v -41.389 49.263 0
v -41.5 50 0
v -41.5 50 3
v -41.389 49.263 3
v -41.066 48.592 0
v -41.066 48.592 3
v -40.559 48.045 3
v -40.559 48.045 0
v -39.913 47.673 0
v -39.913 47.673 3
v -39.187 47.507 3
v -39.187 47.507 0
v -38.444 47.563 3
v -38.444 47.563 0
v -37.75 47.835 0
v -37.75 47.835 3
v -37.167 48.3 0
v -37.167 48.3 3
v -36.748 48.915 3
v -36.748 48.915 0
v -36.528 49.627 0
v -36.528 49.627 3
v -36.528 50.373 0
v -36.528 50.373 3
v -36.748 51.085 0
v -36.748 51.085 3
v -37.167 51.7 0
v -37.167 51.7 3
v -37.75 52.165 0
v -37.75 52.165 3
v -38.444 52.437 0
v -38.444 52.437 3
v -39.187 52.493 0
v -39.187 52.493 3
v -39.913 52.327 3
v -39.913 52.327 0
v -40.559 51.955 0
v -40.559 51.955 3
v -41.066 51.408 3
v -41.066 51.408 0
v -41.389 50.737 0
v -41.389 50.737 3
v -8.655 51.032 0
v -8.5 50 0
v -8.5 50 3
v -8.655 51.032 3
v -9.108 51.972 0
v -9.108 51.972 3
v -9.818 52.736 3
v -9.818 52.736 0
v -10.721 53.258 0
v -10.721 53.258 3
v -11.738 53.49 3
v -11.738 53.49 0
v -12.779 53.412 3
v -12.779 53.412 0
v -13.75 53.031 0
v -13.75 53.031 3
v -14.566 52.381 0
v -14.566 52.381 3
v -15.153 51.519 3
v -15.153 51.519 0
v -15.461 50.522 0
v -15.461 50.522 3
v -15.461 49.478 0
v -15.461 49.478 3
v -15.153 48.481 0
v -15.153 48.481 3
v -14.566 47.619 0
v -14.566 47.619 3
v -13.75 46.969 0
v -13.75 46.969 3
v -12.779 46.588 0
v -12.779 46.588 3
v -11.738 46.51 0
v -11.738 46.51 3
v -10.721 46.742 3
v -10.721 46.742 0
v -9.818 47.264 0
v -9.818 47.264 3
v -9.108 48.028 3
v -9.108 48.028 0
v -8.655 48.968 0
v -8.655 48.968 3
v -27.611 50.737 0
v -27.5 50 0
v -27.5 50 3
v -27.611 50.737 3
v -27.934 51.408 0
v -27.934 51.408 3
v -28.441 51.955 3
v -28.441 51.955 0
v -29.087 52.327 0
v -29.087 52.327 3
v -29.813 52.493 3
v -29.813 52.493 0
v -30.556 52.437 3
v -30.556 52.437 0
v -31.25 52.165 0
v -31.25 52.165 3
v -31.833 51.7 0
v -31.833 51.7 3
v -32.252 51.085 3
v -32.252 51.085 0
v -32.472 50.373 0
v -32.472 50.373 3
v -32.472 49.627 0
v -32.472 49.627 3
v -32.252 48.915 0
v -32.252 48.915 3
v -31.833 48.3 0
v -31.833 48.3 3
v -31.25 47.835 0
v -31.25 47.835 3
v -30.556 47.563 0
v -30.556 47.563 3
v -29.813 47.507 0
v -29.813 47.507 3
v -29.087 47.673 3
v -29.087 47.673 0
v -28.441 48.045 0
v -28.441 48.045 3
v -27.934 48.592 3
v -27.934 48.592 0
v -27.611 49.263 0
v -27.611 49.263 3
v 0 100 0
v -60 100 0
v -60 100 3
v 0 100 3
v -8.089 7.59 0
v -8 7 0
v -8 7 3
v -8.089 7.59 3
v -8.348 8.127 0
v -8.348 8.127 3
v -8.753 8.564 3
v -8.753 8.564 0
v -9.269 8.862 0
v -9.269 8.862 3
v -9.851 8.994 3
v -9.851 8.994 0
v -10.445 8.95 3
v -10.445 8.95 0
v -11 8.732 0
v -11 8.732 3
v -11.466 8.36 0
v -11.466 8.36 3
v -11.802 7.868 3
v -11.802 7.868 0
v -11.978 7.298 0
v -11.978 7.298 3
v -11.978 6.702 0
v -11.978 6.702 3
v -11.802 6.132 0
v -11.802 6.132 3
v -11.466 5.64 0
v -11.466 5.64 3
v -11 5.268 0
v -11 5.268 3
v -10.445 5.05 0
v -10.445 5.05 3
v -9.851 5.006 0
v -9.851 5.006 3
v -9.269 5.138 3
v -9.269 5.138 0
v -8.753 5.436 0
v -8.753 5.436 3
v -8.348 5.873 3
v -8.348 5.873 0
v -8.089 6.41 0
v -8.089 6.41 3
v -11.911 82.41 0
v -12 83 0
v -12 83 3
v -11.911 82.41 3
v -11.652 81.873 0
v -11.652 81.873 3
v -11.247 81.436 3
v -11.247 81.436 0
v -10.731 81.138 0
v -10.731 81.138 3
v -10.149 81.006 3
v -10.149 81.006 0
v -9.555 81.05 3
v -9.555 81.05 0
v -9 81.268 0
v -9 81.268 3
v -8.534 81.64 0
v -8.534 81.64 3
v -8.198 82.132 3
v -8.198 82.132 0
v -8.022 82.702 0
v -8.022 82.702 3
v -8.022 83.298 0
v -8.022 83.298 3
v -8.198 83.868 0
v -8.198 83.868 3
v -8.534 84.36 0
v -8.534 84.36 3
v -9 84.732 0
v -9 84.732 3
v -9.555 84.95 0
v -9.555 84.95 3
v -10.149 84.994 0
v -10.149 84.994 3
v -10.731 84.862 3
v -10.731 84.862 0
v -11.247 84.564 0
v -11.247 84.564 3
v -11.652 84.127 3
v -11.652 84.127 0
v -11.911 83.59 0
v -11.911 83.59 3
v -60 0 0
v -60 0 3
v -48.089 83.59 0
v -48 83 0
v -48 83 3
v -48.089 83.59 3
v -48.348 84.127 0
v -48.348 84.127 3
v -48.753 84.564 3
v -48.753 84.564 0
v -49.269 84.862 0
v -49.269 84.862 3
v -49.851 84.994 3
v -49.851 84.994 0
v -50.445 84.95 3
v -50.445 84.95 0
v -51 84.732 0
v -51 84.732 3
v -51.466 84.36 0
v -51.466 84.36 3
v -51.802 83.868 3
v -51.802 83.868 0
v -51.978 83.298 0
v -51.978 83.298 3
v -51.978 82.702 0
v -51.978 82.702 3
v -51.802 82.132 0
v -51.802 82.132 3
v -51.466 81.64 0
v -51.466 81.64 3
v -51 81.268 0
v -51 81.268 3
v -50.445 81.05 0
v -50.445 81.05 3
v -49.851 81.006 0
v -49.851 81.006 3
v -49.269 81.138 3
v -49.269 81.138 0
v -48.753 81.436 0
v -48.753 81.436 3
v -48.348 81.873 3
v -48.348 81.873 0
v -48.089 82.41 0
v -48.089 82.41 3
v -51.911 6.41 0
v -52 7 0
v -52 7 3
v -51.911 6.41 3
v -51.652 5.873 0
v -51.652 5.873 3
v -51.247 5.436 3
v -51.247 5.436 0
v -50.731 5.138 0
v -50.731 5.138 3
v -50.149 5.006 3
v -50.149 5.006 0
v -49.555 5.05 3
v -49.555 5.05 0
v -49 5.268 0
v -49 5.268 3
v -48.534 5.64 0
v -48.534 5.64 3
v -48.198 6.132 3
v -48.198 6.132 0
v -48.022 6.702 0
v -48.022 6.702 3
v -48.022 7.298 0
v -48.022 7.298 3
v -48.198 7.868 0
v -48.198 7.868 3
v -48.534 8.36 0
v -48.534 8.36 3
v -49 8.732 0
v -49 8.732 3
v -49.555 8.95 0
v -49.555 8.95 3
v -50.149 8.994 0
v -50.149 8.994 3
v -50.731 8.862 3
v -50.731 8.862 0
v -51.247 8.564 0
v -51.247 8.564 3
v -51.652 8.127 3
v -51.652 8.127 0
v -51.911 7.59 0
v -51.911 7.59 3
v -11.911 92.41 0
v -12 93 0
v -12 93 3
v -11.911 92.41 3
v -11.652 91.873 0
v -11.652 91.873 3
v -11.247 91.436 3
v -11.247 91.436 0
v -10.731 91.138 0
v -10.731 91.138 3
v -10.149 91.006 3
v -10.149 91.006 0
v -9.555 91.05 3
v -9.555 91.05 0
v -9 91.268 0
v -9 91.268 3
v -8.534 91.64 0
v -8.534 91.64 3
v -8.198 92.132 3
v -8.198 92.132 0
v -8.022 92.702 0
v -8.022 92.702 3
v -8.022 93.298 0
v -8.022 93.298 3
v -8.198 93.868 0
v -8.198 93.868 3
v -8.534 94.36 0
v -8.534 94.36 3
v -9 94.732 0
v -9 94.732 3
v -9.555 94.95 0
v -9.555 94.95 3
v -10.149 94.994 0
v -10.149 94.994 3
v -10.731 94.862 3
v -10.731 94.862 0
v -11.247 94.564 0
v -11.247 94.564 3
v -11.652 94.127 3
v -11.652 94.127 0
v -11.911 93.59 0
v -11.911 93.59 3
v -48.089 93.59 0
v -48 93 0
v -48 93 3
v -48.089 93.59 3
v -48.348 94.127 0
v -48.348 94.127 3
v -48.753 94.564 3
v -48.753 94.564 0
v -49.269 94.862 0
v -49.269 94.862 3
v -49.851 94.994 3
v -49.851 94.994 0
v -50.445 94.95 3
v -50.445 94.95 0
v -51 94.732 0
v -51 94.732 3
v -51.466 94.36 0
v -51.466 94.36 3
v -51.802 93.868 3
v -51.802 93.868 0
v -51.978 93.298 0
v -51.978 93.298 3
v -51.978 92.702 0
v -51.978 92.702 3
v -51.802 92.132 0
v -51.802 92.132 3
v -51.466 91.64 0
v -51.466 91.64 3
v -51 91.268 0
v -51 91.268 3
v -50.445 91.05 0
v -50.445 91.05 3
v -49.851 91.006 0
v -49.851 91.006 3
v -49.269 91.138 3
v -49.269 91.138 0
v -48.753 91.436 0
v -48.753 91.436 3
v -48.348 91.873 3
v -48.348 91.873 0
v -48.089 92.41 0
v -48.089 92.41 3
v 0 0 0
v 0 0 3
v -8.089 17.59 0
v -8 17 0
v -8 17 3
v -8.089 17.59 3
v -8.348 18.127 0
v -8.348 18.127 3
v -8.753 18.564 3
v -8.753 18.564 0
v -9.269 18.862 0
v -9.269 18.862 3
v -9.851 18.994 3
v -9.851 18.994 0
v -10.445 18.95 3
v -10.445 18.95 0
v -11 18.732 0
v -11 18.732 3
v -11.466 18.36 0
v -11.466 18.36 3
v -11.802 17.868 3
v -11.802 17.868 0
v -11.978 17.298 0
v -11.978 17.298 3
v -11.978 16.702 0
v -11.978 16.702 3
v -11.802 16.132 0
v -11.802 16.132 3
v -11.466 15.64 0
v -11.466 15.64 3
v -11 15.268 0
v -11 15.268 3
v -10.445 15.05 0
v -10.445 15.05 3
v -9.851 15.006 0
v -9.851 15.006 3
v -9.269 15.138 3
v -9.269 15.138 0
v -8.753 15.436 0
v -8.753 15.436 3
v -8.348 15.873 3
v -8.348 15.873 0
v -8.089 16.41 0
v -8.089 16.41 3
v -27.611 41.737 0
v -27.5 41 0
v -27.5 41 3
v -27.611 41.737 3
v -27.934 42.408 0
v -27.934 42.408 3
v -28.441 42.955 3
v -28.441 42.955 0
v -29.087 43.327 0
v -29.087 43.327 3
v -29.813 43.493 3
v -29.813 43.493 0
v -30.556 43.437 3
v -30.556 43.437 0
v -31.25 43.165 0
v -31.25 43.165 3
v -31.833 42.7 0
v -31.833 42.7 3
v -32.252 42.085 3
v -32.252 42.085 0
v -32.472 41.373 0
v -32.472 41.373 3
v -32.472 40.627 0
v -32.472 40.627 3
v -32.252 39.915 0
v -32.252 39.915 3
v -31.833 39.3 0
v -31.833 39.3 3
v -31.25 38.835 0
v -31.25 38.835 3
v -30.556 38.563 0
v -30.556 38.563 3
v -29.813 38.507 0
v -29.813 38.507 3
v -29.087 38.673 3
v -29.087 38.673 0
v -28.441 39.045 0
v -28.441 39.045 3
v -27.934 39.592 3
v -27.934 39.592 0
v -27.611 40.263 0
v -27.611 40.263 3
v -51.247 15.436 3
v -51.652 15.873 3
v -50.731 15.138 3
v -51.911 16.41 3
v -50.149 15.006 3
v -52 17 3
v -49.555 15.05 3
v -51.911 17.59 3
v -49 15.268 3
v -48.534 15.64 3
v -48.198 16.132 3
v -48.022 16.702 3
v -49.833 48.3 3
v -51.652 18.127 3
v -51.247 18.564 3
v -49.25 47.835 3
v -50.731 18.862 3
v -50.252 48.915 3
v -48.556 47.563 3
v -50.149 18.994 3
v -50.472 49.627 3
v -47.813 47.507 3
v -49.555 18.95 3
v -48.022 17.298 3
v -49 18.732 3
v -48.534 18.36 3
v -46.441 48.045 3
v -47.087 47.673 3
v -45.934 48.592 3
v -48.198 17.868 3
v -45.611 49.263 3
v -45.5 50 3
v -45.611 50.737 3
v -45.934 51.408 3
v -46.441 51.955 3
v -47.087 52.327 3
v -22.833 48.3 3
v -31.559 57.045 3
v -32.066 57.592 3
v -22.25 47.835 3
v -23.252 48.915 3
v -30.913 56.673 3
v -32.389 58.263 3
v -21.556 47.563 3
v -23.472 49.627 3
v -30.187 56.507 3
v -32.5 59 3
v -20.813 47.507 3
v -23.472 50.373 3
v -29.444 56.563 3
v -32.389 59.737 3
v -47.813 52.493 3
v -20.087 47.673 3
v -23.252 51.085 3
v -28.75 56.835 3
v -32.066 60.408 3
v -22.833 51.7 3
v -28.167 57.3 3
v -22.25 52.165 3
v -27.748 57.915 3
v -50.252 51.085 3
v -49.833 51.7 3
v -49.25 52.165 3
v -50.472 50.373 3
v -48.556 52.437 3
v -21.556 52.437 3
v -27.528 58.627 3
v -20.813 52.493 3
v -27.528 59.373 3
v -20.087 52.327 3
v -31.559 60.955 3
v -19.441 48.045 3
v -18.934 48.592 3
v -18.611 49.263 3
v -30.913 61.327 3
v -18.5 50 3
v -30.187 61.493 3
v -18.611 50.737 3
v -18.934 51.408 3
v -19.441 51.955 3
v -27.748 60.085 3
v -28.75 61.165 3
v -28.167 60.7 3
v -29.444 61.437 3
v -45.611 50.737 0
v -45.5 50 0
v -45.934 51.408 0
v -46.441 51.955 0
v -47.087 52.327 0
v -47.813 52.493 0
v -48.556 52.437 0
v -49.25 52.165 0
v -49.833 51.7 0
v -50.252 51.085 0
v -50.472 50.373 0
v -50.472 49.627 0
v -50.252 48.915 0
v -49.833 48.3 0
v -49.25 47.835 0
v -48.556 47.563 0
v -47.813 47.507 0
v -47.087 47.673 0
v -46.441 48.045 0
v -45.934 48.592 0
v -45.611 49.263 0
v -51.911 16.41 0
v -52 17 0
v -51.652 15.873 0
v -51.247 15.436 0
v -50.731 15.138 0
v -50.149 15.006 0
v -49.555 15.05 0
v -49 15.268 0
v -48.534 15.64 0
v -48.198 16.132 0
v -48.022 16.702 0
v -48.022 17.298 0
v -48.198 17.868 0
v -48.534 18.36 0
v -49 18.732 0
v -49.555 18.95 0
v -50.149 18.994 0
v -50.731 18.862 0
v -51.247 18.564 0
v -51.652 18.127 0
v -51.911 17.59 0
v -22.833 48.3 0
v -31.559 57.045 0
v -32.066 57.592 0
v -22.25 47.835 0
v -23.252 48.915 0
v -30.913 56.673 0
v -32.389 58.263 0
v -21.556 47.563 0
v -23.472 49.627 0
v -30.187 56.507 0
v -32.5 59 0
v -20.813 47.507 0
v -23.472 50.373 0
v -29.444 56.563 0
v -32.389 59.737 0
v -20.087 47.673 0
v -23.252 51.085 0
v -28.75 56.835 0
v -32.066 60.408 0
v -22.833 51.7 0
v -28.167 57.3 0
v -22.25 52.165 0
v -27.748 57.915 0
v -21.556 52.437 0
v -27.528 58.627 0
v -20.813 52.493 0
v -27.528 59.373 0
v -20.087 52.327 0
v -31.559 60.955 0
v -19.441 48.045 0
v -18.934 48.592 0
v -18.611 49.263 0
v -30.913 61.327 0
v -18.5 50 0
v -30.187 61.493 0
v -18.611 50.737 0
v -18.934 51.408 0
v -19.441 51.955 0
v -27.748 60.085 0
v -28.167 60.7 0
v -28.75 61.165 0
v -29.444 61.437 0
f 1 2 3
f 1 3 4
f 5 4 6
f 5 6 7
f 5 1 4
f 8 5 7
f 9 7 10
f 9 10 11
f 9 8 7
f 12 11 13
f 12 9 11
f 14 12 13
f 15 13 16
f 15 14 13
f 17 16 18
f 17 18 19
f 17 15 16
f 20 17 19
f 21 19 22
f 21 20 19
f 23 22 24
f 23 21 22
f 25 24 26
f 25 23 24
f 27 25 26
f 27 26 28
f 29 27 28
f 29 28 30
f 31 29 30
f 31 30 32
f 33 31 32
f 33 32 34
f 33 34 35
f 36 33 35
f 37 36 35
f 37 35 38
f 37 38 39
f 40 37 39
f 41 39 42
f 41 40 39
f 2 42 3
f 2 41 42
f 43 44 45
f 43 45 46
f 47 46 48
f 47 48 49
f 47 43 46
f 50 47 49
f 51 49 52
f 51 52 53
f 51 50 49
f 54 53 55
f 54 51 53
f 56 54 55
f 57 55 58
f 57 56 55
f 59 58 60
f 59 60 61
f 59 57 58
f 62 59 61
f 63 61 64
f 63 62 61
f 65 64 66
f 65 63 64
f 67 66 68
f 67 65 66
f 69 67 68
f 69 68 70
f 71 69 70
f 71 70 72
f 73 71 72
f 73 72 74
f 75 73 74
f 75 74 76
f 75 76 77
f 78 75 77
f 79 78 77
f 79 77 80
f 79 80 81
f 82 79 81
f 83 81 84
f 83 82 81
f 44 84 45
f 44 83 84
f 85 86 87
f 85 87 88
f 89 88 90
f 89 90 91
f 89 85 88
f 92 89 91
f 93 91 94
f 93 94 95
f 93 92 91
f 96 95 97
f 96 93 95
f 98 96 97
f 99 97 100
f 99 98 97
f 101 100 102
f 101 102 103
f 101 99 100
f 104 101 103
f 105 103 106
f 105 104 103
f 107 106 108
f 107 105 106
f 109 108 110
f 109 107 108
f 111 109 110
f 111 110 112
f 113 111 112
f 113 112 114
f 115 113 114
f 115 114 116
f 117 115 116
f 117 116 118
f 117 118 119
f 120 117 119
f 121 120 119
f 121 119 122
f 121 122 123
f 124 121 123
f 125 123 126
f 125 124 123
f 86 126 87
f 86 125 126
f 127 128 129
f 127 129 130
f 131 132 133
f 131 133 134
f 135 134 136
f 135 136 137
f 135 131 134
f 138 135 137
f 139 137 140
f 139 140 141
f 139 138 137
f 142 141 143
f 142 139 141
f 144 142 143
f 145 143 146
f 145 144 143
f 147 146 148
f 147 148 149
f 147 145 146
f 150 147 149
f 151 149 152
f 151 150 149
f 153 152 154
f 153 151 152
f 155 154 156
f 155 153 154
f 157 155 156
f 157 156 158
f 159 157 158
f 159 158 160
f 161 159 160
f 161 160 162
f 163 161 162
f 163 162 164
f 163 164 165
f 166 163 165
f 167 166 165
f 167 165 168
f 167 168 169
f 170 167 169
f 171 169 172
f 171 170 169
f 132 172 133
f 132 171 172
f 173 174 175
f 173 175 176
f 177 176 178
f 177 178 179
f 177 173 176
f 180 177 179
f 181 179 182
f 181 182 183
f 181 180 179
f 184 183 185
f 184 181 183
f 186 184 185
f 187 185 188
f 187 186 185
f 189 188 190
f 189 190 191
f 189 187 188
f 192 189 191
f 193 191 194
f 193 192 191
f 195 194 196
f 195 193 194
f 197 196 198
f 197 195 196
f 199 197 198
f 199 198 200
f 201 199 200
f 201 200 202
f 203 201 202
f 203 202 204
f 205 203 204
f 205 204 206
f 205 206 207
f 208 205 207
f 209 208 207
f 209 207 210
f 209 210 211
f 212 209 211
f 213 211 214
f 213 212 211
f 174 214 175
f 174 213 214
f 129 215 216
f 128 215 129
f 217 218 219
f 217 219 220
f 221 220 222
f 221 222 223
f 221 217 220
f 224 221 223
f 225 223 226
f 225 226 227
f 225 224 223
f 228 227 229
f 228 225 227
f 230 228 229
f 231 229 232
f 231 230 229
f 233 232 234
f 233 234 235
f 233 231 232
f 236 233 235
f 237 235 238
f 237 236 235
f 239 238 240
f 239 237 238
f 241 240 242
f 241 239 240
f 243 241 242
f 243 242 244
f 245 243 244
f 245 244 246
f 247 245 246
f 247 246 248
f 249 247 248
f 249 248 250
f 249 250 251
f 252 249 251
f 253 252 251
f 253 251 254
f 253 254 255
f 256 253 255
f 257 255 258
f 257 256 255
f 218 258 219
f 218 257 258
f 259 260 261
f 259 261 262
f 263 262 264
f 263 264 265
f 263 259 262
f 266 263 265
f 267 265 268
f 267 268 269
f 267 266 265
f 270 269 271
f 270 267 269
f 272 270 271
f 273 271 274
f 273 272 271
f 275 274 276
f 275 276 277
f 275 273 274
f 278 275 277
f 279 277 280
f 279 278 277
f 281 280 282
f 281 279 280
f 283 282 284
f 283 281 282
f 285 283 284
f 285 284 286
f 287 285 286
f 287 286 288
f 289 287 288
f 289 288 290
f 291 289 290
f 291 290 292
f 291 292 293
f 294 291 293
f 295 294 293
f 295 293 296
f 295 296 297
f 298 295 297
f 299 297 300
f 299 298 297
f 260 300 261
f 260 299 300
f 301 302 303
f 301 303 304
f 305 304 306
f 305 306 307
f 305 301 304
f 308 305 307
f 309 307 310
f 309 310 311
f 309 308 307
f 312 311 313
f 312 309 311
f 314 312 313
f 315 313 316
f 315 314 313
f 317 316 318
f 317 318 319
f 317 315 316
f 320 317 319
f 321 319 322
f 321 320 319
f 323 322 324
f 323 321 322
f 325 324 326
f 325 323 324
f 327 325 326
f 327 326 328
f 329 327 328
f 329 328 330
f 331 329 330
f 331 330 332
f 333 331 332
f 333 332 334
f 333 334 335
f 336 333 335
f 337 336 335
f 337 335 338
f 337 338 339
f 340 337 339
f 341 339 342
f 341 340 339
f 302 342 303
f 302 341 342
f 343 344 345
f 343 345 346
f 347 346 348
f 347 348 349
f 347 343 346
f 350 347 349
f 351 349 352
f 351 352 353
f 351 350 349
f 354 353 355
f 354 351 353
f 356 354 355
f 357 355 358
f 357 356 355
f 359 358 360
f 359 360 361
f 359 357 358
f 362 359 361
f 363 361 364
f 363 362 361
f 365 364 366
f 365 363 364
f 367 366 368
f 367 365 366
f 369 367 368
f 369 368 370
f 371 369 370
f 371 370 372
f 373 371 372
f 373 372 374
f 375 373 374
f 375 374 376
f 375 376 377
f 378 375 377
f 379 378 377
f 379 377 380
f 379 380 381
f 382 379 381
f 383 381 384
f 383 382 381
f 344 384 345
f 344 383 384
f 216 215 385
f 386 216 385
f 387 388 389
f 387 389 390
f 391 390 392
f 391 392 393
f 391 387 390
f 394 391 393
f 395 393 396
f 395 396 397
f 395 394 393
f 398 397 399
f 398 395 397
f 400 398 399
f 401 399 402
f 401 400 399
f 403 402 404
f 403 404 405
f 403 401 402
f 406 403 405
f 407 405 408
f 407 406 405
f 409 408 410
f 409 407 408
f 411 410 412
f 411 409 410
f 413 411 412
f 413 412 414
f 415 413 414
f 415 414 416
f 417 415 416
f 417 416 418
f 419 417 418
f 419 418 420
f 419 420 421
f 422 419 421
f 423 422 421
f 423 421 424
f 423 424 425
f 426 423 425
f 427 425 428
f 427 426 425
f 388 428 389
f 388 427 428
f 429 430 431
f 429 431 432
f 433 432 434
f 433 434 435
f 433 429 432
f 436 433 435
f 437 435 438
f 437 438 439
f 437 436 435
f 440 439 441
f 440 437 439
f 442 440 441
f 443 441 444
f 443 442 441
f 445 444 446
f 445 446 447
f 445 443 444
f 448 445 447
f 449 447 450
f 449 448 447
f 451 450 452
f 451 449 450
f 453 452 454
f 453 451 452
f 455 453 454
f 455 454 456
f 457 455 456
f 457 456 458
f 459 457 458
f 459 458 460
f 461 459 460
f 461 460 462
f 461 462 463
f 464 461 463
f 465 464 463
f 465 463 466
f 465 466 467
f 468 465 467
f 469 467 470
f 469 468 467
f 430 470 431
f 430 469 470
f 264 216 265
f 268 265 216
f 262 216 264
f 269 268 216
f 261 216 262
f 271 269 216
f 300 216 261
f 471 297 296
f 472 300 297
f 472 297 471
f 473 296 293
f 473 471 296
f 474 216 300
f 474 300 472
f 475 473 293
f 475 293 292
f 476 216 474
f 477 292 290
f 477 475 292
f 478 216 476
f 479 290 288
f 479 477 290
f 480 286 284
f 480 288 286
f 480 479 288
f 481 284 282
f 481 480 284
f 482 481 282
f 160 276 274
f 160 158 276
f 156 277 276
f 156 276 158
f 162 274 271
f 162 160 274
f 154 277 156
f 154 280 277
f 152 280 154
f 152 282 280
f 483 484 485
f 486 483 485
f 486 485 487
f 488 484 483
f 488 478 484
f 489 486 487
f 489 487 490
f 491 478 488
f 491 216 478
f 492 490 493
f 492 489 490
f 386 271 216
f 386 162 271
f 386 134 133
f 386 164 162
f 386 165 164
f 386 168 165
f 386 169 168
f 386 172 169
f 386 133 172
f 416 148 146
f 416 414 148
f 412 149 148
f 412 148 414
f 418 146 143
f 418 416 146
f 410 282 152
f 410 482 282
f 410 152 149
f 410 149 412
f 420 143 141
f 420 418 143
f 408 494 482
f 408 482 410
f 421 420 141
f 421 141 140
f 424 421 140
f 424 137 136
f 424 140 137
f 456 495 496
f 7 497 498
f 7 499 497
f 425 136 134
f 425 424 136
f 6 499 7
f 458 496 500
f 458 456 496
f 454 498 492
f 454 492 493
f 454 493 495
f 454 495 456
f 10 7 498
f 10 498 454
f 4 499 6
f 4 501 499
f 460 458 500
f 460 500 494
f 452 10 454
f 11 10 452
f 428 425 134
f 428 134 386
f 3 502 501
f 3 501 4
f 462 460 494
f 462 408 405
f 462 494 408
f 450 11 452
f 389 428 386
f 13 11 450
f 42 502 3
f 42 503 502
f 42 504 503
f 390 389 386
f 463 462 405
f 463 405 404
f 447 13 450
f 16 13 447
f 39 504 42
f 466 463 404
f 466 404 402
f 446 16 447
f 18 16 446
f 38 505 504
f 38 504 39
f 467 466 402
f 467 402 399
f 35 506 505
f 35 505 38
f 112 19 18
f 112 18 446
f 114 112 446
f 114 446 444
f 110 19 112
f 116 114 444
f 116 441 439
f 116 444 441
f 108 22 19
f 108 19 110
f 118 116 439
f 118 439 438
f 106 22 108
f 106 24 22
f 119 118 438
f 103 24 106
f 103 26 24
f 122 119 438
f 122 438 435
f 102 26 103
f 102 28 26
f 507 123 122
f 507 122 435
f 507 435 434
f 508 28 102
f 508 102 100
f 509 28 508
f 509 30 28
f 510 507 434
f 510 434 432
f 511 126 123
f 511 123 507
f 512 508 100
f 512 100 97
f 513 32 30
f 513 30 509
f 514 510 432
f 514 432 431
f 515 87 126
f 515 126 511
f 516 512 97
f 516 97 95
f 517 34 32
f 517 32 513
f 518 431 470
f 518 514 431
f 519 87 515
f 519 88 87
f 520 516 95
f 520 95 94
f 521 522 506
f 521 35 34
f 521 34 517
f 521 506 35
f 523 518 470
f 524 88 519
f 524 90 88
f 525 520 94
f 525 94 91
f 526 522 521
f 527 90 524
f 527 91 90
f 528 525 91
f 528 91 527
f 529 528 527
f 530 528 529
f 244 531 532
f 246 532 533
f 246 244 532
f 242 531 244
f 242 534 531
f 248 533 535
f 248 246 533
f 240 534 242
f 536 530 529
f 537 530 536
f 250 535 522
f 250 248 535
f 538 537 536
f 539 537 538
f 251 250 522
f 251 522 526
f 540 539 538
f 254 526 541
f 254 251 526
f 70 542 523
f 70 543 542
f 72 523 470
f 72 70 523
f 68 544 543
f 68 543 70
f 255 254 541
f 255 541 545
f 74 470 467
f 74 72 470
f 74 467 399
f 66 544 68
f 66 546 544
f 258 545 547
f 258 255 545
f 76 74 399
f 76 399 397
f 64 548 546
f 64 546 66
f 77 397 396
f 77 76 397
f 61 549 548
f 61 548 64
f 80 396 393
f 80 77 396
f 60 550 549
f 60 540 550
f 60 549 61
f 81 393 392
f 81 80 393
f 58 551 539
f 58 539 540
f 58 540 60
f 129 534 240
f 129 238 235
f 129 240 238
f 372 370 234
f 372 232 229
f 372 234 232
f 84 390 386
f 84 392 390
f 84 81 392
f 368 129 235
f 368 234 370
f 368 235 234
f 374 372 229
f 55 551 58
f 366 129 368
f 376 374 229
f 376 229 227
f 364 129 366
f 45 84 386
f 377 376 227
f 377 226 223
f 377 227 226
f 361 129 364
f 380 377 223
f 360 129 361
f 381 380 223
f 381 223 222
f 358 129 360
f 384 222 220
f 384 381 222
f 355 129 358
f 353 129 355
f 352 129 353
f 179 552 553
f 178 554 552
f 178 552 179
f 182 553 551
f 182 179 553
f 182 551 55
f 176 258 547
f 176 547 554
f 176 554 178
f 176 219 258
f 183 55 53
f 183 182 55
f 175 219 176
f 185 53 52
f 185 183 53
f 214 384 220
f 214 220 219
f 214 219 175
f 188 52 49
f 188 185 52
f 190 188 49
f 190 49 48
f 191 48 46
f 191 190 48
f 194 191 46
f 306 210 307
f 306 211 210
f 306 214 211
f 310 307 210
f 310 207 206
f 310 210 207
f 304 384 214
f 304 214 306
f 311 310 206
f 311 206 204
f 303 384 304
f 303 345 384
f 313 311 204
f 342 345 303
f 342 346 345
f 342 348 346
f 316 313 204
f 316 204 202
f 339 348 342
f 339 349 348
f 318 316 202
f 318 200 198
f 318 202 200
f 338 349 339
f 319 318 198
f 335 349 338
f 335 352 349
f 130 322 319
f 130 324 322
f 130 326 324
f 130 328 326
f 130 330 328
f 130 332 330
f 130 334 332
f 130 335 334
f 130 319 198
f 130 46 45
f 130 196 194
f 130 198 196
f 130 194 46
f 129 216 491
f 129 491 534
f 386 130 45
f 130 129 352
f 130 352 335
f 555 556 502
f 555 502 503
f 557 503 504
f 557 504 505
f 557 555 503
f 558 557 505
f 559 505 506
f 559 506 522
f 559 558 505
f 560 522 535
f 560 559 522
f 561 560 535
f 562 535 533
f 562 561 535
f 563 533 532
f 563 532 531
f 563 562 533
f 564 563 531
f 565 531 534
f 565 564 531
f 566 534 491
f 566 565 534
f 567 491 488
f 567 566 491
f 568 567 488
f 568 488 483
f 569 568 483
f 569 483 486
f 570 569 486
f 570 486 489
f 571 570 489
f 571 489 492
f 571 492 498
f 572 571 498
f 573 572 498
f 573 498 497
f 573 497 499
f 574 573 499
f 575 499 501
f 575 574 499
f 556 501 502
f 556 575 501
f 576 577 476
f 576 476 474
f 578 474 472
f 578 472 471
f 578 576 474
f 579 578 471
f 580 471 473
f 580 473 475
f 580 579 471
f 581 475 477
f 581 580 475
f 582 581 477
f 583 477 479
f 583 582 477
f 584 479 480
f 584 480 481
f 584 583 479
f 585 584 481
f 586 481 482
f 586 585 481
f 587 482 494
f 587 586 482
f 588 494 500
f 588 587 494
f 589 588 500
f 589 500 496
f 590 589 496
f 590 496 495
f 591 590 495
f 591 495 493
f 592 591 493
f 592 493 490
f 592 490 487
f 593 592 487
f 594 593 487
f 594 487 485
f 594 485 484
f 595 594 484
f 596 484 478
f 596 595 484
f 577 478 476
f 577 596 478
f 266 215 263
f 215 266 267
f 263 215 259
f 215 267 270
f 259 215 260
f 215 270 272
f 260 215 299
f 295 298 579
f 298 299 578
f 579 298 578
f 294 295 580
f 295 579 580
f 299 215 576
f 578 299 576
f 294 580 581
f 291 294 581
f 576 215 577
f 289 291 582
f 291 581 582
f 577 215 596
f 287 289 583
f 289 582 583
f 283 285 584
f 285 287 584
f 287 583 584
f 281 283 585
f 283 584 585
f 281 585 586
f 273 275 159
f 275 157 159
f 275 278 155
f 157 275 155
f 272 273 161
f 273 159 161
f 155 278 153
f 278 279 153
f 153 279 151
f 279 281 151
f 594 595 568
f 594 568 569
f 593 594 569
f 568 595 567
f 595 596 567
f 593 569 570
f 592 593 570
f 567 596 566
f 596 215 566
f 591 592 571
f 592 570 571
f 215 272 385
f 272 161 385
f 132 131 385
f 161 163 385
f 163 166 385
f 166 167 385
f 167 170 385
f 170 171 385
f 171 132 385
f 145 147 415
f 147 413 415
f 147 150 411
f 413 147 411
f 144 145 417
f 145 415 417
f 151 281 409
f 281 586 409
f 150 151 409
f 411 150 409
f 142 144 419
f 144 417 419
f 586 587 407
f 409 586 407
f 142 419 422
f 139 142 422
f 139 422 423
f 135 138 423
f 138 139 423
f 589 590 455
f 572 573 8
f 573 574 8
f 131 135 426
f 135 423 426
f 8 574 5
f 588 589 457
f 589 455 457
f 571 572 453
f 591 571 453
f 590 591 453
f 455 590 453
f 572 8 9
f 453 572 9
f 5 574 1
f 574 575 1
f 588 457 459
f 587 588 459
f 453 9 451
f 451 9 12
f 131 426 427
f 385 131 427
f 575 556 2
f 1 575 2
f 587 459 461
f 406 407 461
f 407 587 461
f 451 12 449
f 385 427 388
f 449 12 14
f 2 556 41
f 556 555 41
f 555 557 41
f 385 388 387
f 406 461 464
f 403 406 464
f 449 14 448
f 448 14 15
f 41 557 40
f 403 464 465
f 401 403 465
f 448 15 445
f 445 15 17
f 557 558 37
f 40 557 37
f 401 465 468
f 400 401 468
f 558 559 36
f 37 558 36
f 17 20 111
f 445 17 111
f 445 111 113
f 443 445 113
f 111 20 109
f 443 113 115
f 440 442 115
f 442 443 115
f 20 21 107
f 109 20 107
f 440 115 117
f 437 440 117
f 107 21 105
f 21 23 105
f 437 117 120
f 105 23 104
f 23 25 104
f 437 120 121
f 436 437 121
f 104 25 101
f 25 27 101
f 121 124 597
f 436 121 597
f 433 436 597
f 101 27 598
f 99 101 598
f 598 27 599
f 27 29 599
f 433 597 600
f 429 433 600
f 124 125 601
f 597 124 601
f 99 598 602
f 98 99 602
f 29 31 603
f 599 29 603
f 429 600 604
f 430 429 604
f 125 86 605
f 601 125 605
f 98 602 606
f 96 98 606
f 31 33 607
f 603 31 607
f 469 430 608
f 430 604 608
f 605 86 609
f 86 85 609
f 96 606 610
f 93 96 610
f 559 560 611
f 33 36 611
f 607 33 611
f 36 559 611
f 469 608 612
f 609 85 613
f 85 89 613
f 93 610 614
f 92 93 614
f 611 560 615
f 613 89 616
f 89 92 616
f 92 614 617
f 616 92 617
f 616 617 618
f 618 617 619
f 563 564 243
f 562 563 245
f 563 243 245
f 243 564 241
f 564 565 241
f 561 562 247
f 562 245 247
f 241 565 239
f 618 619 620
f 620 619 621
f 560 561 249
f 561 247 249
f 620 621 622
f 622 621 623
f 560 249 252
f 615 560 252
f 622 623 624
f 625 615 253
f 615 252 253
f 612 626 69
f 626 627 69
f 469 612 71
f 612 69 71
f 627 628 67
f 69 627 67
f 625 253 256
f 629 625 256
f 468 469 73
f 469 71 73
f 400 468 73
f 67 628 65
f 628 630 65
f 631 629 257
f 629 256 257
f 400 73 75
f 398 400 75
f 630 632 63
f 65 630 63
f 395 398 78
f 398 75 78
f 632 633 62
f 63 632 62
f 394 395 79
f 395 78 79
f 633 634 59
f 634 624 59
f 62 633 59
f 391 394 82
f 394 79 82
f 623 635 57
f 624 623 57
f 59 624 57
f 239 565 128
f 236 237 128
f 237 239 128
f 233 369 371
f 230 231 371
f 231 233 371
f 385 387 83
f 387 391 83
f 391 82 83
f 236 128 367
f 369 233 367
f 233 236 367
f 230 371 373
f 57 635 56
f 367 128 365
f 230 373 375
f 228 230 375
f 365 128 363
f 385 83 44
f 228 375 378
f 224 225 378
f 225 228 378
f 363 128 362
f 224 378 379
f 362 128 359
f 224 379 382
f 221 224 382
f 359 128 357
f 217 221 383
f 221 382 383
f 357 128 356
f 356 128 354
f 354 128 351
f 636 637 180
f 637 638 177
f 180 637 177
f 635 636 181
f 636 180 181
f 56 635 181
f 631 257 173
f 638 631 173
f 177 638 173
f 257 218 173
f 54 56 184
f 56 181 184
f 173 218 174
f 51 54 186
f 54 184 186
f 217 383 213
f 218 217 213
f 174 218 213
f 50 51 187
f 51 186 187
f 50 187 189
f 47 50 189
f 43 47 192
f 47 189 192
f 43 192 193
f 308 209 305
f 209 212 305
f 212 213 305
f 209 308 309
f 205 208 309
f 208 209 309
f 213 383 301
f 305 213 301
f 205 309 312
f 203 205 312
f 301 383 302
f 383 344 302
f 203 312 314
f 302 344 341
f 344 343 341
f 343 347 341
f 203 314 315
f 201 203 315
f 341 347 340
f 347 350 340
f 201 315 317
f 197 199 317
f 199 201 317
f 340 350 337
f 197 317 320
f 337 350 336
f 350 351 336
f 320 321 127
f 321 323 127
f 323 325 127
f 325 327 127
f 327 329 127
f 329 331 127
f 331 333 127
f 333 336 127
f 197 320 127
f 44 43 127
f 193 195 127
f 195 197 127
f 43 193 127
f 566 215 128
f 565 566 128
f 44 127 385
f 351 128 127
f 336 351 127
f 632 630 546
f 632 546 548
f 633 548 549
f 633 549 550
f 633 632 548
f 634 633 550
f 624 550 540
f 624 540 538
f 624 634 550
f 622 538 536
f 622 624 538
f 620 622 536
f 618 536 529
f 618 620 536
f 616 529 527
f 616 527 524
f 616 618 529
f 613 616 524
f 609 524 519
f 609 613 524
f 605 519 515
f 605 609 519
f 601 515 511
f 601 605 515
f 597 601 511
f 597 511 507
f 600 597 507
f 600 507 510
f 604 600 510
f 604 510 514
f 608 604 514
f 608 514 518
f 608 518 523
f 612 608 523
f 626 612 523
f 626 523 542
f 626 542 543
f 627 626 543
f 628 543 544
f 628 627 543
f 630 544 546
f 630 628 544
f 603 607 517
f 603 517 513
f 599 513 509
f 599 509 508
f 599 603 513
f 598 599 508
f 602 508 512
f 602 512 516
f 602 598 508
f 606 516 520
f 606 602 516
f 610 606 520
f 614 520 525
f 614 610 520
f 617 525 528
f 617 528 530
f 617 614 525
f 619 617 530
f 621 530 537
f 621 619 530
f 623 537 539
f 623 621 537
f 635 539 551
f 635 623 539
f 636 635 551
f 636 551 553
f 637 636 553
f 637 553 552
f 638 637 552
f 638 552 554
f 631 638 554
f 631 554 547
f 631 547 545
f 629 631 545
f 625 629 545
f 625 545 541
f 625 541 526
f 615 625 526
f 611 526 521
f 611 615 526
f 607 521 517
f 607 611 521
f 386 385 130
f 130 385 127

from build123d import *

# Parameters (mm, degrees)
SKETCH_1_W      = 60
SKETCH_1_H      = 100
SKETCH_1_R      = 2.5
SKETCH_1_R_2    = 2
SKETCH_1_R_3    = 3.5
EXTRUDE_1_DEPTH = 3


with BuildPart() as part:
    # Эскиз1 → Бобышка-Вытянуть1 (new body)
    with BuildSketch(Plane.XY):
        with Locations((-30, 50)):
            Rectangle(SKETCH_1_W, SKETCH_1_H)
        with Locations((-30, 50)):
            Circle(SKETCH_1_R, mode=Mode.SUBTRACT)
        with Locations((-21, 50)):
            Circle(SKETCH_1_R, mode=Mode.SUBTRACT)
        with Locations(Location((-39, 50, 0), (0, 0, 180))):
            Circle(SKETCH_1_R, mode=Mode.SUBTRACT)
        with Locations((-30, 41)):
            Circle(SKETCH_1_R, mode=Mode.SUBTRACT)
        with Locations(Location((-30, 59, 0), (0, 0, 180))):
            Circle(SKETCH_1_R, mode=Mode.SUBTRACT)
        with Locations((-50, 93)):
            Circle(SKETCH_1_R_2, mode=Mode.SUBTRACT)
        with Locations((-50, 83)):
            Circle(SKETCH_1_R_2, mode=Mode.SUBTRACT)
        with Locations(Location((-10, 83, 0), (0, 0, 180))):
            Circle(SKETCH_1_R_2, mode=Mode.SUBTRACT)
        with Locations(Location((-10, 93, 0), (0, 0, 180))):
            Circle(SKETCH_1_R_2, mode=Mode.SUBTRACT)
        with Locations((-10, 17)):
            Circle(SKETCH_1_R_2, mode=Mode.SUBTRACT)
        with Locations((-10, 7)):
            Circle(SKETCH_1_R_2, mode=Mode.SUBTRACT)
        with Locations(Location((-50, 7, 0), (0, 0, 180))):
            Circle(SKETCH_1_R_2, mode=Mode.SUBTRACT)
        with Locations(Location((-50, 17, 0), (0, 0, 180))):
            Circle(SKETCH_1_R_2, mode=Mode.SUBTRACT)
        with Locations((-48, 50)):
            Circle(SKETCH_1_R, mode=Mode.SUBTRACT)
        with Locations((-12, 50)):
            Circle(SKETCH_1_R_3, mode=Mode.SUBTRACT)
    extrude(amount=EXTRUDE_1_DEPTH)


solid = part.part
